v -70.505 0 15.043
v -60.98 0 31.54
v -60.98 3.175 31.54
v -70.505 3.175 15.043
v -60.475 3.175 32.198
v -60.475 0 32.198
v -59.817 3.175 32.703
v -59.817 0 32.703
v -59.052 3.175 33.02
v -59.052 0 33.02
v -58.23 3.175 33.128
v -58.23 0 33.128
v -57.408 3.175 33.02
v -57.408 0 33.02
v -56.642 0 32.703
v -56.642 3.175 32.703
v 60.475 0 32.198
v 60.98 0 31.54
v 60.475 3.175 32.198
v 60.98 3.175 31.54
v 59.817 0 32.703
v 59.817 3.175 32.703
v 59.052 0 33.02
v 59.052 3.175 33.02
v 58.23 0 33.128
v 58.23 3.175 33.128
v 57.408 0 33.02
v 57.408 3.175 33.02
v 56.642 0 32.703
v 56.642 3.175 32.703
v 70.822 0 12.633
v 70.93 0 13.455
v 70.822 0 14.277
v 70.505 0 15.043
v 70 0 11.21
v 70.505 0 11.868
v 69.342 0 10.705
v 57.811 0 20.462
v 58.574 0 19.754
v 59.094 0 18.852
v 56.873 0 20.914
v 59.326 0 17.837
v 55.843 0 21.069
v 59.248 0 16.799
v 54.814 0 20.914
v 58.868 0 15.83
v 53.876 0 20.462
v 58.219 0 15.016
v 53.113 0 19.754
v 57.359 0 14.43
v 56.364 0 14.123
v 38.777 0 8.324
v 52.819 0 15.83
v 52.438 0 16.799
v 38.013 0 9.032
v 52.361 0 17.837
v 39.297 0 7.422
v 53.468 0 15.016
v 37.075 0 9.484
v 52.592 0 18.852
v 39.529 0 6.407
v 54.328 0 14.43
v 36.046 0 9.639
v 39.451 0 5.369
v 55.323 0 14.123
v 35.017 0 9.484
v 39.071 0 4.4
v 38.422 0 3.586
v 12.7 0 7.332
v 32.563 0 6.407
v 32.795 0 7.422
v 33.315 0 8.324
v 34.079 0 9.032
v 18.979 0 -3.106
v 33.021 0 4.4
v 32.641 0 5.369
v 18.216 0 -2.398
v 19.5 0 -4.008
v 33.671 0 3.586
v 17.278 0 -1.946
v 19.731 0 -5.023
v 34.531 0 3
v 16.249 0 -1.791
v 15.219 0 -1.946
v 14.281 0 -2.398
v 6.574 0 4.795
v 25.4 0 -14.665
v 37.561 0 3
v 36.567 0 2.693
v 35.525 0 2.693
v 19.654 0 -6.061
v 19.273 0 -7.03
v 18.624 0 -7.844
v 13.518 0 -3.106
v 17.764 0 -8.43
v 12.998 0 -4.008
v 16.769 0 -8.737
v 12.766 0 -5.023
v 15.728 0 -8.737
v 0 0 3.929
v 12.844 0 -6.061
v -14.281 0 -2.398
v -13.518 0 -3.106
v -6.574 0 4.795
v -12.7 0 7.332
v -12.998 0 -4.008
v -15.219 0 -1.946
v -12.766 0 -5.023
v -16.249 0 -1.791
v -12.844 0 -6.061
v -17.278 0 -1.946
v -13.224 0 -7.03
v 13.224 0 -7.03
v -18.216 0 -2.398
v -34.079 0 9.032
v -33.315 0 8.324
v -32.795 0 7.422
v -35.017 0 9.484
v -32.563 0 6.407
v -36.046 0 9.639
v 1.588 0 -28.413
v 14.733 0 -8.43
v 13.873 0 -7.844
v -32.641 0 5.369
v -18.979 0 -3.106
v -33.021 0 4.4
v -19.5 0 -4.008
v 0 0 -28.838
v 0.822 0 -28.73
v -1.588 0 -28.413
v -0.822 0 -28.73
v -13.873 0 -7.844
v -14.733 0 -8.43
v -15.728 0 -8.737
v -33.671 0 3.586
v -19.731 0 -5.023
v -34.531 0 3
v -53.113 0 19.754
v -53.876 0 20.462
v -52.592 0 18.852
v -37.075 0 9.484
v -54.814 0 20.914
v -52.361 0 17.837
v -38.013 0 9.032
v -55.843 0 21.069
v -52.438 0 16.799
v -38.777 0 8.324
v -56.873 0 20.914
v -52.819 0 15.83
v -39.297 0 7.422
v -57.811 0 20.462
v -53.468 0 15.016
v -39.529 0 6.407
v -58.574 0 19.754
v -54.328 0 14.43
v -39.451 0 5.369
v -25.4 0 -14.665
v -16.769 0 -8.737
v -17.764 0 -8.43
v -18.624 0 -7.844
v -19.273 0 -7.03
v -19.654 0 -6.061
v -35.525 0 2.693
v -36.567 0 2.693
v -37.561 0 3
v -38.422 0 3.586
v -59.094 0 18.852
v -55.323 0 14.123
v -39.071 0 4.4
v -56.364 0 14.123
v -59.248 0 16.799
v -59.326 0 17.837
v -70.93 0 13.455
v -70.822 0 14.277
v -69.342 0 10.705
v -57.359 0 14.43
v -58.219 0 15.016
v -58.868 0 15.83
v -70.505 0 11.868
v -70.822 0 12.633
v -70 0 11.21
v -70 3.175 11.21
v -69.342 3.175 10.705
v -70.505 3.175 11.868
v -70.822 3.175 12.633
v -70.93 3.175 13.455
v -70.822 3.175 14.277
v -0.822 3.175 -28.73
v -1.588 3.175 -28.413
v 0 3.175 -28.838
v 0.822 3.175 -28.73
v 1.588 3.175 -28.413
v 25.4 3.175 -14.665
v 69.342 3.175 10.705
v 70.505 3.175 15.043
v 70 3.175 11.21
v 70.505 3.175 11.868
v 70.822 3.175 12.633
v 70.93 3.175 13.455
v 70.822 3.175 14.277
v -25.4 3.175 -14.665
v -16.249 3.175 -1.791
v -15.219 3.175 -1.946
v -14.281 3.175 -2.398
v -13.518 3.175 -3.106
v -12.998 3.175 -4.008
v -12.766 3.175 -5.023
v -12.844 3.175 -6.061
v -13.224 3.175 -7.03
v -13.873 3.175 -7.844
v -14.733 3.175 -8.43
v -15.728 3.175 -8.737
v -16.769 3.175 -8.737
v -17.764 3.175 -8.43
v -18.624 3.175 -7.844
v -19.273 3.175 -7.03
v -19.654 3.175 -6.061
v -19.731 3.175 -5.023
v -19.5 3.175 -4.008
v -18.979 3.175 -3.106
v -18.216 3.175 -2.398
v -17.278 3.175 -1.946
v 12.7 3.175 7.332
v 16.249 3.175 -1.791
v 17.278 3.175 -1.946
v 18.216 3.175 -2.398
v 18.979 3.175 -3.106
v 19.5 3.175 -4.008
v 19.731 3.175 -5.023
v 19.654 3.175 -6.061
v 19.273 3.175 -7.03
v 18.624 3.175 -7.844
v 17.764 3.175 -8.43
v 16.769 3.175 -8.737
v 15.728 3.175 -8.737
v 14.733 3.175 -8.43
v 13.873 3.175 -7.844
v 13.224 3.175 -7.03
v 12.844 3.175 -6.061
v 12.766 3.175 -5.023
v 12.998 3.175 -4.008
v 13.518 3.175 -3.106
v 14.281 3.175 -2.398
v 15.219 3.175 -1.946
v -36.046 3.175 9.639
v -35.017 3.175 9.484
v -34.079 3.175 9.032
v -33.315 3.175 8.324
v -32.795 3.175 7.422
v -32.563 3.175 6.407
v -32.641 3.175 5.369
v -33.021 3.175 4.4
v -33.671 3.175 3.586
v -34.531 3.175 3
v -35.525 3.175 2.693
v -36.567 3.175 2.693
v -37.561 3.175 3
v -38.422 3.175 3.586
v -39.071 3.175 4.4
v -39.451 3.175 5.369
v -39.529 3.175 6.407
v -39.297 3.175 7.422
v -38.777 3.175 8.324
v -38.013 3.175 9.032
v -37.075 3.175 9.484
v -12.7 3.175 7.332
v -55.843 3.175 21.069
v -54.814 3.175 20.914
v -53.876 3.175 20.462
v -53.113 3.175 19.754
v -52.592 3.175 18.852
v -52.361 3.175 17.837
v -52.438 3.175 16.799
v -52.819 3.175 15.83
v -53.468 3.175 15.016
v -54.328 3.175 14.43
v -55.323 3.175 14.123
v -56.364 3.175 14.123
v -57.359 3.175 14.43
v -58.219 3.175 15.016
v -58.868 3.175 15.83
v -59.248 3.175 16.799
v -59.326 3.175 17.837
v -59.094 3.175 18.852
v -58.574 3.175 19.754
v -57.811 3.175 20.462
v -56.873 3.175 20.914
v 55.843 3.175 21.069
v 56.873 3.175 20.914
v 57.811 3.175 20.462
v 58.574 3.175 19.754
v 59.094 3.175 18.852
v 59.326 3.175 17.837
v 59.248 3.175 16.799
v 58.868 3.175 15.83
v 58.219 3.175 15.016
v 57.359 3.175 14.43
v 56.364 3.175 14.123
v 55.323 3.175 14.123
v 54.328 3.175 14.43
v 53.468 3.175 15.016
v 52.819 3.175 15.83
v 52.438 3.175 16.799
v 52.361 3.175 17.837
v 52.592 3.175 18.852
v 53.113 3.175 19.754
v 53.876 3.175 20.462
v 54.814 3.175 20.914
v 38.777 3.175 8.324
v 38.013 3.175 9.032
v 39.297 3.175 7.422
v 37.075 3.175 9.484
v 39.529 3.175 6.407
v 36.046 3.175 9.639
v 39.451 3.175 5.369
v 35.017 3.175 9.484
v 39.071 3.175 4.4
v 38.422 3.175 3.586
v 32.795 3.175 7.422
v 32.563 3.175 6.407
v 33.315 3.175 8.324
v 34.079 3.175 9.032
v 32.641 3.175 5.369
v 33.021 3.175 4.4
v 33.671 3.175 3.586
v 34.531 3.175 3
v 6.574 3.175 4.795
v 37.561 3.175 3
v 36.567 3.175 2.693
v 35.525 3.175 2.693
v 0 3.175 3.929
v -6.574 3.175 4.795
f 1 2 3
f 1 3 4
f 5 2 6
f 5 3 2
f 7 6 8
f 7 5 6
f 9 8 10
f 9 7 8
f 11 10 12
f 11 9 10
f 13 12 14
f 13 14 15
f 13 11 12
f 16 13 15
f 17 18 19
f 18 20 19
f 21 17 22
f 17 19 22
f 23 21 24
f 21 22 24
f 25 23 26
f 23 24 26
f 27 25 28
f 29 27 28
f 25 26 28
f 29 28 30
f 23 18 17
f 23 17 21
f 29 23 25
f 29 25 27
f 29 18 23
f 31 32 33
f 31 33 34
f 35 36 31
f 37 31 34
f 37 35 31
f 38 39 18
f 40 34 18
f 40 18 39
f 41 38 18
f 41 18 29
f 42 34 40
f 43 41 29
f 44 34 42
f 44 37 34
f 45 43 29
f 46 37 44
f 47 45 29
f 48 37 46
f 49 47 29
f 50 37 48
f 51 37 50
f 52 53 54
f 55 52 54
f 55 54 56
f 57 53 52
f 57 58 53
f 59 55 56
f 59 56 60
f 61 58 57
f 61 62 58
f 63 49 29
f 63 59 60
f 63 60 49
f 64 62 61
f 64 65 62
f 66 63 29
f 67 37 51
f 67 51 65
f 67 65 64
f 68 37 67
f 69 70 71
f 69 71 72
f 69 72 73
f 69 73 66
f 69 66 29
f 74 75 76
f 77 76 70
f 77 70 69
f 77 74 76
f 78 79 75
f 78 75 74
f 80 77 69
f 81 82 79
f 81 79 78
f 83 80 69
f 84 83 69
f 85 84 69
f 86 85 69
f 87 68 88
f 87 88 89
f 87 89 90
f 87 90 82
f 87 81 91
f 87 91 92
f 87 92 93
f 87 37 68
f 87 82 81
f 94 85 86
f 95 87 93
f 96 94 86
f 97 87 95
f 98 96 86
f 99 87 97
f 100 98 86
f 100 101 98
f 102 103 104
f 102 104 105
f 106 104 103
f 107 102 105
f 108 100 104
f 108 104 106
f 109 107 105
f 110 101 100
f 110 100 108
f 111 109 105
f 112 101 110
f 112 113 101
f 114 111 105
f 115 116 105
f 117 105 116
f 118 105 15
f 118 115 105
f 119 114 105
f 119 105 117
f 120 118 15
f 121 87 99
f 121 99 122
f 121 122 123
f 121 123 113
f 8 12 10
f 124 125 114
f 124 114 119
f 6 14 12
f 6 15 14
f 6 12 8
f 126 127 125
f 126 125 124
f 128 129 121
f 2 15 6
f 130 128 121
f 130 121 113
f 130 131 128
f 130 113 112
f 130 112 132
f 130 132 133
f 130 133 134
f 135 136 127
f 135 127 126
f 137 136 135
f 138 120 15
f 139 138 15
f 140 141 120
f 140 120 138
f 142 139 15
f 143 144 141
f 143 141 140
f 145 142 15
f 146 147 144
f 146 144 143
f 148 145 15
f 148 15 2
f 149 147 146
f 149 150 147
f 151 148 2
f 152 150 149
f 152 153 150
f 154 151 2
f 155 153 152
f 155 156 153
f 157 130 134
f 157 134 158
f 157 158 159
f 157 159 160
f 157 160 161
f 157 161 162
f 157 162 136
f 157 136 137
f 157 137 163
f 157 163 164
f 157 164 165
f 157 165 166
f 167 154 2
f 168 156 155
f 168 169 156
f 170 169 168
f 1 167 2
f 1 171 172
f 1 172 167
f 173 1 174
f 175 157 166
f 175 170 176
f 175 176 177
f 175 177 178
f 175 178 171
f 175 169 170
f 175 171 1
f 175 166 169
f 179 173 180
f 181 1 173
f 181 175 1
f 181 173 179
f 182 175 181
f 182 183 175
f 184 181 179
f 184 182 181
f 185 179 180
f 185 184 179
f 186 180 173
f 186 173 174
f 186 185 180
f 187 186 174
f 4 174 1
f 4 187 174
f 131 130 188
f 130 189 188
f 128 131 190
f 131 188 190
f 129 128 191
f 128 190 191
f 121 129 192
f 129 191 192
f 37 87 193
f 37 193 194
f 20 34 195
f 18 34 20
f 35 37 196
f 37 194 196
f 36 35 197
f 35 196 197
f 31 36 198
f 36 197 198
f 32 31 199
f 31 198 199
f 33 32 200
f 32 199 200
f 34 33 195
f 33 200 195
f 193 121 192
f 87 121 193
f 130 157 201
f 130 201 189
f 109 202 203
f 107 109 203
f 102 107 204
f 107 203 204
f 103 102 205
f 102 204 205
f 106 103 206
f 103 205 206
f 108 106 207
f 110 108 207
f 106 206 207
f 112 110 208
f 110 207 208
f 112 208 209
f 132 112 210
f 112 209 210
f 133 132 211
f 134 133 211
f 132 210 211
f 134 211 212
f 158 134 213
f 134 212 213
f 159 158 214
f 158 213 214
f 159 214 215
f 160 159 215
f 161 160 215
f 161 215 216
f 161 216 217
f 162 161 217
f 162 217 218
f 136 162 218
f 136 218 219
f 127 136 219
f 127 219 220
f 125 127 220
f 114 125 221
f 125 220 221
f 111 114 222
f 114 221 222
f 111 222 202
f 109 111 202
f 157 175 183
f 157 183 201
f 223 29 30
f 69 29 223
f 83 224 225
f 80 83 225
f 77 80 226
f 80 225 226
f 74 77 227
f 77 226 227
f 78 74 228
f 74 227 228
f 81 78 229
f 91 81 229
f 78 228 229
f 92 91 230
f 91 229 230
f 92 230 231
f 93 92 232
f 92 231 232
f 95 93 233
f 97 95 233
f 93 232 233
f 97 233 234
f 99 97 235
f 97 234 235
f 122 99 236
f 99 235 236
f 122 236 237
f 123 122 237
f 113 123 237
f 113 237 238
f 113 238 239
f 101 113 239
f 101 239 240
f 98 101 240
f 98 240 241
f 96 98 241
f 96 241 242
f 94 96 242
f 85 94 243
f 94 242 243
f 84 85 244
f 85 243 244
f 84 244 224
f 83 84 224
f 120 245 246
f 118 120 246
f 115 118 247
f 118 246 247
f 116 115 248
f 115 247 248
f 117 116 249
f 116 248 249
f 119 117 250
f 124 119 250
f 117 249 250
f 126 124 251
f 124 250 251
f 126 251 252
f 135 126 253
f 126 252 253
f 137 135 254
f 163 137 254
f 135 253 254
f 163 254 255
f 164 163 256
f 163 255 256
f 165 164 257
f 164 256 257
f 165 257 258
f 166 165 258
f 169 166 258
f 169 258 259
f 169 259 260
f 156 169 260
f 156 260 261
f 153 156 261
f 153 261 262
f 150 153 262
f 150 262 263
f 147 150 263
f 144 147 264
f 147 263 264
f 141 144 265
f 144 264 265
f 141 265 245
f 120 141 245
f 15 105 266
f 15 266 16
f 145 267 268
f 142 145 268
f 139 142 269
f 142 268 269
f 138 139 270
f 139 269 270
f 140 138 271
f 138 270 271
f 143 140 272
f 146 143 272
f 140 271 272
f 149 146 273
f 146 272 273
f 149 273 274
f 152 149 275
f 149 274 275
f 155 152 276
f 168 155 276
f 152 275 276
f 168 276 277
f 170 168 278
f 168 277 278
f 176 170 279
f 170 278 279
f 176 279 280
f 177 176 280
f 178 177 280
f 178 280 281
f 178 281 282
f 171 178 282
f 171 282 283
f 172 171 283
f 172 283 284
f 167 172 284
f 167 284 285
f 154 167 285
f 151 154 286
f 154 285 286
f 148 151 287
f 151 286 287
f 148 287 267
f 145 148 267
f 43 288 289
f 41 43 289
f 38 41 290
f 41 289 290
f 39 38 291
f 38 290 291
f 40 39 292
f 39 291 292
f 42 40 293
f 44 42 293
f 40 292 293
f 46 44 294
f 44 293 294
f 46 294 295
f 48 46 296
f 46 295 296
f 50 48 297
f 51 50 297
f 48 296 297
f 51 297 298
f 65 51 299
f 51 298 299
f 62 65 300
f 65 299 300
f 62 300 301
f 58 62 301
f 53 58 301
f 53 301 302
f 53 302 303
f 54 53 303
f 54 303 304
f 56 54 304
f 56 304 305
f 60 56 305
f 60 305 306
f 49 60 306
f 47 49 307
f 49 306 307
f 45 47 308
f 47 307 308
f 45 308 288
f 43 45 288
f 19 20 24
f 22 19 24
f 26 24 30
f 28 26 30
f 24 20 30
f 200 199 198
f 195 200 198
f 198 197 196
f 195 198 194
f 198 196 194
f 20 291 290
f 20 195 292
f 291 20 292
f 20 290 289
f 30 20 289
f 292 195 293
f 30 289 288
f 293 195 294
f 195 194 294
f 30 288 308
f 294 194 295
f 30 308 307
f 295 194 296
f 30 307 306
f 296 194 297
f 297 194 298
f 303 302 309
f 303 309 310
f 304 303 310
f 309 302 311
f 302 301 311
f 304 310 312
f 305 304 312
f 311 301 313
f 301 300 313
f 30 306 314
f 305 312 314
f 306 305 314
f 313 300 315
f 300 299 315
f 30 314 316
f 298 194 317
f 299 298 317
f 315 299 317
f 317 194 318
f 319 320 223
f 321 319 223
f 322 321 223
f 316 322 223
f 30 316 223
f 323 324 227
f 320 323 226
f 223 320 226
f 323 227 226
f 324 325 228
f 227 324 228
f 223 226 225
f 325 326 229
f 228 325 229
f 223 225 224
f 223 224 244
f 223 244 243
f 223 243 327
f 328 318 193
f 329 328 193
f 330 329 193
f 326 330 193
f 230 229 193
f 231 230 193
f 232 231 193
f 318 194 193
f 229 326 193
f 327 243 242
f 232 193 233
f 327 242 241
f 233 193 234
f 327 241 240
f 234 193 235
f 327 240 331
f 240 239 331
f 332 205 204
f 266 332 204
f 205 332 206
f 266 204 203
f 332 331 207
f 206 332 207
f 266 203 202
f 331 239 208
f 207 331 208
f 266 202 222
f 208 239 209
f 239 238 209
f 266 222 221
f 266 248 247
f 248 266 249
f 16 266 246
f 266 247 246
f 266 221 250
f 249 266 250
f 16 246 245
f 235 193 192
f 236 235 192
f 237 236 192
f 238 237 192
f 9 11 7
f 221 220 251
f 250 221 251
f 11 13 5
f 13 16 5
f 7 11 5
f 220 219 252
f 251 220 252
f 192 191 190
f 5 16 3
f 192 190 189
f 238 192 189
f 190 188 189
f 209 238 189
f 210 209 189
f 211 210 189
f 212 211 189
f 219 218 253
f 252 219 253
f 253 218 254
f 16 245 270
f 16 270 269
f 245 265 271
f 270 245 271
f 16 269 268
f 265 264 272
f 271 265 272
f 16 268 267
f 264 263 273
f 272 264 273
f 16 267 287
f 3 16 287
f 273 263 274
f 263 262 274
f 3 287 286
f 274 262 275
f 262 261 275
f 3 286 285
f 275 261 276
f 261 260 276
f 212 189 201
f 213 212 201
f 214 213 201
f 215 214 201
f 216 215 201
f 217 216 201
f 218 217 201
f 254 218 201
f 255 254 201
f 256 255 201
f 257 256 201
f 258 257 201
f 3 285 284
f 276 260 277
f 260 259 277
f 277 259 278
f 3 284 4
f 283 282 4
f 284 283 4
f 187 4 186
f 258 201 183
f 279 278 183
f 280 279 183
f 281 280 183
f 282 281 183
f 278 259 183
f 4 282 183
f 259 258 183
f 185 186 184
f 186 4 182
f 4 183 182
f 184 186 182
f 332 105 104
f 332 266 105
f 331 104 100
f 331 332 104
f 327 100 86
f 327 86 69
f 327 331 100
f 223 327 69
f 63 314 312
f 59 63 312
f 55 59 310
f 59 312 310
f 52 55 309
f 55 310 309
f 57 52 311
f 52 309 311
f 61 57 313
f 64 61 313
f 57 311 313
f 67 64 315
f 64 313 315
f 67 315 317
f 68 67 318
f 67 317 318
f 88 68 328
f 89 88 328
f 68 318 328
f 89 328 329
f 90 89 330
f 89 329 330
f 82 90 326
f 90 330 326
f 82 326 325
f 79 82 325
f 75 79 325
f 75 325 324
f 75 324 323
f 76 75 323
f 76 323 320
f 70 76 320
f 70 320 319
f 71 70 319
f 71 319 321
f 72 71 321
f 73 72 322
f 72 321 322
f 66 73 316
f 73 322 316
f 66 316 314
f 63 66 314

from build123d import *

# Parameters (mm, degrees)
BOSS_EXTRUDE1_DEPTH = 3.175
SKETCH2_R           = 3.4925
CUT_EXTRUDE2_DEPTH  = 3.175
LPATTERN5_COUNT     = 3
LPATTERN5_PITCH     = 22.86
SKETCH7_R           = 3.4925
CUT_EXTRUDE3_DEPTH  = 3.175
LPATTERN6_COUNT     = 3
LPATTERN6_PITCH     = 22.86
FILLET1_R           = 3.175
FILLET3_R           = 3.175
FILLET4_R           = 25.4


with BuildPart() as part:
    # Sketch1 → Boss-Extrude1 (new body)
    with BuildSketch(Plane(origin=(0, 0, 0), x_dir=(1, 0, 0), z_dir=(0, 1, 0))):
        Polygon((-25.4, 14.664696837), (0, 29.329393675), (25.4, 14.664696837), (72.092022192, -12.292954744), (59.392022192, -34.29), (0, 0), (-59.392022192, -34.29), (-72.092022192, -12.292954744), align=None)
    extrude(amount=BOSS_EXTRUDE1_DEPTH)

    # Sketch2 → Cut-Extrude2 (cut)
    with BuildSketch(Plane(origin=(0, 3.175, 0), x_dir=(1, 0, 0), z_dir=(0, 1, 0))):
        with Locations((-55.843351826, -17.576477372)):
            Circle(SKETCH2_R)
    cut_extrude2 = extrude(amount=-CUT_EXTRUDE2_DEPTH, mode=Mode.SUBTRACT)

    # LPattern5: Cut-Extrude2 ×3
    with Locations(*[Vector(0.8660254037844387, 0, -0.5000000000000001) * (i * LPATTERN5_PITCH) for i in range(1, LPATTERN5_COUNT)]):
        add(cut_extrude2, mode=Mode.SUBTRACT)

    # Sketch7 → Cut-Extrude3 (cut)
    with BuildSketch(Plane(origin=(0, 3.175, 0), x_dir=(1, 0, 0), z_dir=(0, 1, 0))):
        with Locations((55.843351826, -17.576477372)):
            Circle(SKETCH7_R)
    cut_extrude3 = extrude(amount=-CUT_EXTRUDE3_DEPTH, mode=Mode.SUBTRACT)

    # LPattern6: Cut-Extrude3 ×3
    with Locations(*[Vector(-0.8660254037844377, 0, -0.5000000000000018) * (i * LPATTERN6_PITCH) for i in range(1, LPATTERN6_COUNT)]):
        add(cut_extrude3, mode=Mode.SUBTRACT)

    # Fillet1
    fillet1_edges = [part.edges().sort_by_distance(p)[0] for p in [
        (-59.392022192, 1.5875, 34.29),
        (-72.092022192, 1.5875, 12.292954744),
        (72.092022192, 1.5875, 12.292954744),
        (59.392022192, 1.5875, 34.29),
    ]]
    fillet(fillet1_edges, radius=FILLET1_R)

    # Fillet3
    fillet3_edges = [part.edges().sort_by_distance(p)[0] for p in [
        (0, 1.5875, -29.329393675),
    ]]
    fillet(fillet3_edges, radius=FILLET3_R)

    # Fillet4
    fillet4_edges = [part.edges().sort_by_distance(p)[0] for p in [
        (0, 1.5875, 0),
    ]]
    fillet(fillet4_edges, radius=FILLET4_R)


solid = part.part
